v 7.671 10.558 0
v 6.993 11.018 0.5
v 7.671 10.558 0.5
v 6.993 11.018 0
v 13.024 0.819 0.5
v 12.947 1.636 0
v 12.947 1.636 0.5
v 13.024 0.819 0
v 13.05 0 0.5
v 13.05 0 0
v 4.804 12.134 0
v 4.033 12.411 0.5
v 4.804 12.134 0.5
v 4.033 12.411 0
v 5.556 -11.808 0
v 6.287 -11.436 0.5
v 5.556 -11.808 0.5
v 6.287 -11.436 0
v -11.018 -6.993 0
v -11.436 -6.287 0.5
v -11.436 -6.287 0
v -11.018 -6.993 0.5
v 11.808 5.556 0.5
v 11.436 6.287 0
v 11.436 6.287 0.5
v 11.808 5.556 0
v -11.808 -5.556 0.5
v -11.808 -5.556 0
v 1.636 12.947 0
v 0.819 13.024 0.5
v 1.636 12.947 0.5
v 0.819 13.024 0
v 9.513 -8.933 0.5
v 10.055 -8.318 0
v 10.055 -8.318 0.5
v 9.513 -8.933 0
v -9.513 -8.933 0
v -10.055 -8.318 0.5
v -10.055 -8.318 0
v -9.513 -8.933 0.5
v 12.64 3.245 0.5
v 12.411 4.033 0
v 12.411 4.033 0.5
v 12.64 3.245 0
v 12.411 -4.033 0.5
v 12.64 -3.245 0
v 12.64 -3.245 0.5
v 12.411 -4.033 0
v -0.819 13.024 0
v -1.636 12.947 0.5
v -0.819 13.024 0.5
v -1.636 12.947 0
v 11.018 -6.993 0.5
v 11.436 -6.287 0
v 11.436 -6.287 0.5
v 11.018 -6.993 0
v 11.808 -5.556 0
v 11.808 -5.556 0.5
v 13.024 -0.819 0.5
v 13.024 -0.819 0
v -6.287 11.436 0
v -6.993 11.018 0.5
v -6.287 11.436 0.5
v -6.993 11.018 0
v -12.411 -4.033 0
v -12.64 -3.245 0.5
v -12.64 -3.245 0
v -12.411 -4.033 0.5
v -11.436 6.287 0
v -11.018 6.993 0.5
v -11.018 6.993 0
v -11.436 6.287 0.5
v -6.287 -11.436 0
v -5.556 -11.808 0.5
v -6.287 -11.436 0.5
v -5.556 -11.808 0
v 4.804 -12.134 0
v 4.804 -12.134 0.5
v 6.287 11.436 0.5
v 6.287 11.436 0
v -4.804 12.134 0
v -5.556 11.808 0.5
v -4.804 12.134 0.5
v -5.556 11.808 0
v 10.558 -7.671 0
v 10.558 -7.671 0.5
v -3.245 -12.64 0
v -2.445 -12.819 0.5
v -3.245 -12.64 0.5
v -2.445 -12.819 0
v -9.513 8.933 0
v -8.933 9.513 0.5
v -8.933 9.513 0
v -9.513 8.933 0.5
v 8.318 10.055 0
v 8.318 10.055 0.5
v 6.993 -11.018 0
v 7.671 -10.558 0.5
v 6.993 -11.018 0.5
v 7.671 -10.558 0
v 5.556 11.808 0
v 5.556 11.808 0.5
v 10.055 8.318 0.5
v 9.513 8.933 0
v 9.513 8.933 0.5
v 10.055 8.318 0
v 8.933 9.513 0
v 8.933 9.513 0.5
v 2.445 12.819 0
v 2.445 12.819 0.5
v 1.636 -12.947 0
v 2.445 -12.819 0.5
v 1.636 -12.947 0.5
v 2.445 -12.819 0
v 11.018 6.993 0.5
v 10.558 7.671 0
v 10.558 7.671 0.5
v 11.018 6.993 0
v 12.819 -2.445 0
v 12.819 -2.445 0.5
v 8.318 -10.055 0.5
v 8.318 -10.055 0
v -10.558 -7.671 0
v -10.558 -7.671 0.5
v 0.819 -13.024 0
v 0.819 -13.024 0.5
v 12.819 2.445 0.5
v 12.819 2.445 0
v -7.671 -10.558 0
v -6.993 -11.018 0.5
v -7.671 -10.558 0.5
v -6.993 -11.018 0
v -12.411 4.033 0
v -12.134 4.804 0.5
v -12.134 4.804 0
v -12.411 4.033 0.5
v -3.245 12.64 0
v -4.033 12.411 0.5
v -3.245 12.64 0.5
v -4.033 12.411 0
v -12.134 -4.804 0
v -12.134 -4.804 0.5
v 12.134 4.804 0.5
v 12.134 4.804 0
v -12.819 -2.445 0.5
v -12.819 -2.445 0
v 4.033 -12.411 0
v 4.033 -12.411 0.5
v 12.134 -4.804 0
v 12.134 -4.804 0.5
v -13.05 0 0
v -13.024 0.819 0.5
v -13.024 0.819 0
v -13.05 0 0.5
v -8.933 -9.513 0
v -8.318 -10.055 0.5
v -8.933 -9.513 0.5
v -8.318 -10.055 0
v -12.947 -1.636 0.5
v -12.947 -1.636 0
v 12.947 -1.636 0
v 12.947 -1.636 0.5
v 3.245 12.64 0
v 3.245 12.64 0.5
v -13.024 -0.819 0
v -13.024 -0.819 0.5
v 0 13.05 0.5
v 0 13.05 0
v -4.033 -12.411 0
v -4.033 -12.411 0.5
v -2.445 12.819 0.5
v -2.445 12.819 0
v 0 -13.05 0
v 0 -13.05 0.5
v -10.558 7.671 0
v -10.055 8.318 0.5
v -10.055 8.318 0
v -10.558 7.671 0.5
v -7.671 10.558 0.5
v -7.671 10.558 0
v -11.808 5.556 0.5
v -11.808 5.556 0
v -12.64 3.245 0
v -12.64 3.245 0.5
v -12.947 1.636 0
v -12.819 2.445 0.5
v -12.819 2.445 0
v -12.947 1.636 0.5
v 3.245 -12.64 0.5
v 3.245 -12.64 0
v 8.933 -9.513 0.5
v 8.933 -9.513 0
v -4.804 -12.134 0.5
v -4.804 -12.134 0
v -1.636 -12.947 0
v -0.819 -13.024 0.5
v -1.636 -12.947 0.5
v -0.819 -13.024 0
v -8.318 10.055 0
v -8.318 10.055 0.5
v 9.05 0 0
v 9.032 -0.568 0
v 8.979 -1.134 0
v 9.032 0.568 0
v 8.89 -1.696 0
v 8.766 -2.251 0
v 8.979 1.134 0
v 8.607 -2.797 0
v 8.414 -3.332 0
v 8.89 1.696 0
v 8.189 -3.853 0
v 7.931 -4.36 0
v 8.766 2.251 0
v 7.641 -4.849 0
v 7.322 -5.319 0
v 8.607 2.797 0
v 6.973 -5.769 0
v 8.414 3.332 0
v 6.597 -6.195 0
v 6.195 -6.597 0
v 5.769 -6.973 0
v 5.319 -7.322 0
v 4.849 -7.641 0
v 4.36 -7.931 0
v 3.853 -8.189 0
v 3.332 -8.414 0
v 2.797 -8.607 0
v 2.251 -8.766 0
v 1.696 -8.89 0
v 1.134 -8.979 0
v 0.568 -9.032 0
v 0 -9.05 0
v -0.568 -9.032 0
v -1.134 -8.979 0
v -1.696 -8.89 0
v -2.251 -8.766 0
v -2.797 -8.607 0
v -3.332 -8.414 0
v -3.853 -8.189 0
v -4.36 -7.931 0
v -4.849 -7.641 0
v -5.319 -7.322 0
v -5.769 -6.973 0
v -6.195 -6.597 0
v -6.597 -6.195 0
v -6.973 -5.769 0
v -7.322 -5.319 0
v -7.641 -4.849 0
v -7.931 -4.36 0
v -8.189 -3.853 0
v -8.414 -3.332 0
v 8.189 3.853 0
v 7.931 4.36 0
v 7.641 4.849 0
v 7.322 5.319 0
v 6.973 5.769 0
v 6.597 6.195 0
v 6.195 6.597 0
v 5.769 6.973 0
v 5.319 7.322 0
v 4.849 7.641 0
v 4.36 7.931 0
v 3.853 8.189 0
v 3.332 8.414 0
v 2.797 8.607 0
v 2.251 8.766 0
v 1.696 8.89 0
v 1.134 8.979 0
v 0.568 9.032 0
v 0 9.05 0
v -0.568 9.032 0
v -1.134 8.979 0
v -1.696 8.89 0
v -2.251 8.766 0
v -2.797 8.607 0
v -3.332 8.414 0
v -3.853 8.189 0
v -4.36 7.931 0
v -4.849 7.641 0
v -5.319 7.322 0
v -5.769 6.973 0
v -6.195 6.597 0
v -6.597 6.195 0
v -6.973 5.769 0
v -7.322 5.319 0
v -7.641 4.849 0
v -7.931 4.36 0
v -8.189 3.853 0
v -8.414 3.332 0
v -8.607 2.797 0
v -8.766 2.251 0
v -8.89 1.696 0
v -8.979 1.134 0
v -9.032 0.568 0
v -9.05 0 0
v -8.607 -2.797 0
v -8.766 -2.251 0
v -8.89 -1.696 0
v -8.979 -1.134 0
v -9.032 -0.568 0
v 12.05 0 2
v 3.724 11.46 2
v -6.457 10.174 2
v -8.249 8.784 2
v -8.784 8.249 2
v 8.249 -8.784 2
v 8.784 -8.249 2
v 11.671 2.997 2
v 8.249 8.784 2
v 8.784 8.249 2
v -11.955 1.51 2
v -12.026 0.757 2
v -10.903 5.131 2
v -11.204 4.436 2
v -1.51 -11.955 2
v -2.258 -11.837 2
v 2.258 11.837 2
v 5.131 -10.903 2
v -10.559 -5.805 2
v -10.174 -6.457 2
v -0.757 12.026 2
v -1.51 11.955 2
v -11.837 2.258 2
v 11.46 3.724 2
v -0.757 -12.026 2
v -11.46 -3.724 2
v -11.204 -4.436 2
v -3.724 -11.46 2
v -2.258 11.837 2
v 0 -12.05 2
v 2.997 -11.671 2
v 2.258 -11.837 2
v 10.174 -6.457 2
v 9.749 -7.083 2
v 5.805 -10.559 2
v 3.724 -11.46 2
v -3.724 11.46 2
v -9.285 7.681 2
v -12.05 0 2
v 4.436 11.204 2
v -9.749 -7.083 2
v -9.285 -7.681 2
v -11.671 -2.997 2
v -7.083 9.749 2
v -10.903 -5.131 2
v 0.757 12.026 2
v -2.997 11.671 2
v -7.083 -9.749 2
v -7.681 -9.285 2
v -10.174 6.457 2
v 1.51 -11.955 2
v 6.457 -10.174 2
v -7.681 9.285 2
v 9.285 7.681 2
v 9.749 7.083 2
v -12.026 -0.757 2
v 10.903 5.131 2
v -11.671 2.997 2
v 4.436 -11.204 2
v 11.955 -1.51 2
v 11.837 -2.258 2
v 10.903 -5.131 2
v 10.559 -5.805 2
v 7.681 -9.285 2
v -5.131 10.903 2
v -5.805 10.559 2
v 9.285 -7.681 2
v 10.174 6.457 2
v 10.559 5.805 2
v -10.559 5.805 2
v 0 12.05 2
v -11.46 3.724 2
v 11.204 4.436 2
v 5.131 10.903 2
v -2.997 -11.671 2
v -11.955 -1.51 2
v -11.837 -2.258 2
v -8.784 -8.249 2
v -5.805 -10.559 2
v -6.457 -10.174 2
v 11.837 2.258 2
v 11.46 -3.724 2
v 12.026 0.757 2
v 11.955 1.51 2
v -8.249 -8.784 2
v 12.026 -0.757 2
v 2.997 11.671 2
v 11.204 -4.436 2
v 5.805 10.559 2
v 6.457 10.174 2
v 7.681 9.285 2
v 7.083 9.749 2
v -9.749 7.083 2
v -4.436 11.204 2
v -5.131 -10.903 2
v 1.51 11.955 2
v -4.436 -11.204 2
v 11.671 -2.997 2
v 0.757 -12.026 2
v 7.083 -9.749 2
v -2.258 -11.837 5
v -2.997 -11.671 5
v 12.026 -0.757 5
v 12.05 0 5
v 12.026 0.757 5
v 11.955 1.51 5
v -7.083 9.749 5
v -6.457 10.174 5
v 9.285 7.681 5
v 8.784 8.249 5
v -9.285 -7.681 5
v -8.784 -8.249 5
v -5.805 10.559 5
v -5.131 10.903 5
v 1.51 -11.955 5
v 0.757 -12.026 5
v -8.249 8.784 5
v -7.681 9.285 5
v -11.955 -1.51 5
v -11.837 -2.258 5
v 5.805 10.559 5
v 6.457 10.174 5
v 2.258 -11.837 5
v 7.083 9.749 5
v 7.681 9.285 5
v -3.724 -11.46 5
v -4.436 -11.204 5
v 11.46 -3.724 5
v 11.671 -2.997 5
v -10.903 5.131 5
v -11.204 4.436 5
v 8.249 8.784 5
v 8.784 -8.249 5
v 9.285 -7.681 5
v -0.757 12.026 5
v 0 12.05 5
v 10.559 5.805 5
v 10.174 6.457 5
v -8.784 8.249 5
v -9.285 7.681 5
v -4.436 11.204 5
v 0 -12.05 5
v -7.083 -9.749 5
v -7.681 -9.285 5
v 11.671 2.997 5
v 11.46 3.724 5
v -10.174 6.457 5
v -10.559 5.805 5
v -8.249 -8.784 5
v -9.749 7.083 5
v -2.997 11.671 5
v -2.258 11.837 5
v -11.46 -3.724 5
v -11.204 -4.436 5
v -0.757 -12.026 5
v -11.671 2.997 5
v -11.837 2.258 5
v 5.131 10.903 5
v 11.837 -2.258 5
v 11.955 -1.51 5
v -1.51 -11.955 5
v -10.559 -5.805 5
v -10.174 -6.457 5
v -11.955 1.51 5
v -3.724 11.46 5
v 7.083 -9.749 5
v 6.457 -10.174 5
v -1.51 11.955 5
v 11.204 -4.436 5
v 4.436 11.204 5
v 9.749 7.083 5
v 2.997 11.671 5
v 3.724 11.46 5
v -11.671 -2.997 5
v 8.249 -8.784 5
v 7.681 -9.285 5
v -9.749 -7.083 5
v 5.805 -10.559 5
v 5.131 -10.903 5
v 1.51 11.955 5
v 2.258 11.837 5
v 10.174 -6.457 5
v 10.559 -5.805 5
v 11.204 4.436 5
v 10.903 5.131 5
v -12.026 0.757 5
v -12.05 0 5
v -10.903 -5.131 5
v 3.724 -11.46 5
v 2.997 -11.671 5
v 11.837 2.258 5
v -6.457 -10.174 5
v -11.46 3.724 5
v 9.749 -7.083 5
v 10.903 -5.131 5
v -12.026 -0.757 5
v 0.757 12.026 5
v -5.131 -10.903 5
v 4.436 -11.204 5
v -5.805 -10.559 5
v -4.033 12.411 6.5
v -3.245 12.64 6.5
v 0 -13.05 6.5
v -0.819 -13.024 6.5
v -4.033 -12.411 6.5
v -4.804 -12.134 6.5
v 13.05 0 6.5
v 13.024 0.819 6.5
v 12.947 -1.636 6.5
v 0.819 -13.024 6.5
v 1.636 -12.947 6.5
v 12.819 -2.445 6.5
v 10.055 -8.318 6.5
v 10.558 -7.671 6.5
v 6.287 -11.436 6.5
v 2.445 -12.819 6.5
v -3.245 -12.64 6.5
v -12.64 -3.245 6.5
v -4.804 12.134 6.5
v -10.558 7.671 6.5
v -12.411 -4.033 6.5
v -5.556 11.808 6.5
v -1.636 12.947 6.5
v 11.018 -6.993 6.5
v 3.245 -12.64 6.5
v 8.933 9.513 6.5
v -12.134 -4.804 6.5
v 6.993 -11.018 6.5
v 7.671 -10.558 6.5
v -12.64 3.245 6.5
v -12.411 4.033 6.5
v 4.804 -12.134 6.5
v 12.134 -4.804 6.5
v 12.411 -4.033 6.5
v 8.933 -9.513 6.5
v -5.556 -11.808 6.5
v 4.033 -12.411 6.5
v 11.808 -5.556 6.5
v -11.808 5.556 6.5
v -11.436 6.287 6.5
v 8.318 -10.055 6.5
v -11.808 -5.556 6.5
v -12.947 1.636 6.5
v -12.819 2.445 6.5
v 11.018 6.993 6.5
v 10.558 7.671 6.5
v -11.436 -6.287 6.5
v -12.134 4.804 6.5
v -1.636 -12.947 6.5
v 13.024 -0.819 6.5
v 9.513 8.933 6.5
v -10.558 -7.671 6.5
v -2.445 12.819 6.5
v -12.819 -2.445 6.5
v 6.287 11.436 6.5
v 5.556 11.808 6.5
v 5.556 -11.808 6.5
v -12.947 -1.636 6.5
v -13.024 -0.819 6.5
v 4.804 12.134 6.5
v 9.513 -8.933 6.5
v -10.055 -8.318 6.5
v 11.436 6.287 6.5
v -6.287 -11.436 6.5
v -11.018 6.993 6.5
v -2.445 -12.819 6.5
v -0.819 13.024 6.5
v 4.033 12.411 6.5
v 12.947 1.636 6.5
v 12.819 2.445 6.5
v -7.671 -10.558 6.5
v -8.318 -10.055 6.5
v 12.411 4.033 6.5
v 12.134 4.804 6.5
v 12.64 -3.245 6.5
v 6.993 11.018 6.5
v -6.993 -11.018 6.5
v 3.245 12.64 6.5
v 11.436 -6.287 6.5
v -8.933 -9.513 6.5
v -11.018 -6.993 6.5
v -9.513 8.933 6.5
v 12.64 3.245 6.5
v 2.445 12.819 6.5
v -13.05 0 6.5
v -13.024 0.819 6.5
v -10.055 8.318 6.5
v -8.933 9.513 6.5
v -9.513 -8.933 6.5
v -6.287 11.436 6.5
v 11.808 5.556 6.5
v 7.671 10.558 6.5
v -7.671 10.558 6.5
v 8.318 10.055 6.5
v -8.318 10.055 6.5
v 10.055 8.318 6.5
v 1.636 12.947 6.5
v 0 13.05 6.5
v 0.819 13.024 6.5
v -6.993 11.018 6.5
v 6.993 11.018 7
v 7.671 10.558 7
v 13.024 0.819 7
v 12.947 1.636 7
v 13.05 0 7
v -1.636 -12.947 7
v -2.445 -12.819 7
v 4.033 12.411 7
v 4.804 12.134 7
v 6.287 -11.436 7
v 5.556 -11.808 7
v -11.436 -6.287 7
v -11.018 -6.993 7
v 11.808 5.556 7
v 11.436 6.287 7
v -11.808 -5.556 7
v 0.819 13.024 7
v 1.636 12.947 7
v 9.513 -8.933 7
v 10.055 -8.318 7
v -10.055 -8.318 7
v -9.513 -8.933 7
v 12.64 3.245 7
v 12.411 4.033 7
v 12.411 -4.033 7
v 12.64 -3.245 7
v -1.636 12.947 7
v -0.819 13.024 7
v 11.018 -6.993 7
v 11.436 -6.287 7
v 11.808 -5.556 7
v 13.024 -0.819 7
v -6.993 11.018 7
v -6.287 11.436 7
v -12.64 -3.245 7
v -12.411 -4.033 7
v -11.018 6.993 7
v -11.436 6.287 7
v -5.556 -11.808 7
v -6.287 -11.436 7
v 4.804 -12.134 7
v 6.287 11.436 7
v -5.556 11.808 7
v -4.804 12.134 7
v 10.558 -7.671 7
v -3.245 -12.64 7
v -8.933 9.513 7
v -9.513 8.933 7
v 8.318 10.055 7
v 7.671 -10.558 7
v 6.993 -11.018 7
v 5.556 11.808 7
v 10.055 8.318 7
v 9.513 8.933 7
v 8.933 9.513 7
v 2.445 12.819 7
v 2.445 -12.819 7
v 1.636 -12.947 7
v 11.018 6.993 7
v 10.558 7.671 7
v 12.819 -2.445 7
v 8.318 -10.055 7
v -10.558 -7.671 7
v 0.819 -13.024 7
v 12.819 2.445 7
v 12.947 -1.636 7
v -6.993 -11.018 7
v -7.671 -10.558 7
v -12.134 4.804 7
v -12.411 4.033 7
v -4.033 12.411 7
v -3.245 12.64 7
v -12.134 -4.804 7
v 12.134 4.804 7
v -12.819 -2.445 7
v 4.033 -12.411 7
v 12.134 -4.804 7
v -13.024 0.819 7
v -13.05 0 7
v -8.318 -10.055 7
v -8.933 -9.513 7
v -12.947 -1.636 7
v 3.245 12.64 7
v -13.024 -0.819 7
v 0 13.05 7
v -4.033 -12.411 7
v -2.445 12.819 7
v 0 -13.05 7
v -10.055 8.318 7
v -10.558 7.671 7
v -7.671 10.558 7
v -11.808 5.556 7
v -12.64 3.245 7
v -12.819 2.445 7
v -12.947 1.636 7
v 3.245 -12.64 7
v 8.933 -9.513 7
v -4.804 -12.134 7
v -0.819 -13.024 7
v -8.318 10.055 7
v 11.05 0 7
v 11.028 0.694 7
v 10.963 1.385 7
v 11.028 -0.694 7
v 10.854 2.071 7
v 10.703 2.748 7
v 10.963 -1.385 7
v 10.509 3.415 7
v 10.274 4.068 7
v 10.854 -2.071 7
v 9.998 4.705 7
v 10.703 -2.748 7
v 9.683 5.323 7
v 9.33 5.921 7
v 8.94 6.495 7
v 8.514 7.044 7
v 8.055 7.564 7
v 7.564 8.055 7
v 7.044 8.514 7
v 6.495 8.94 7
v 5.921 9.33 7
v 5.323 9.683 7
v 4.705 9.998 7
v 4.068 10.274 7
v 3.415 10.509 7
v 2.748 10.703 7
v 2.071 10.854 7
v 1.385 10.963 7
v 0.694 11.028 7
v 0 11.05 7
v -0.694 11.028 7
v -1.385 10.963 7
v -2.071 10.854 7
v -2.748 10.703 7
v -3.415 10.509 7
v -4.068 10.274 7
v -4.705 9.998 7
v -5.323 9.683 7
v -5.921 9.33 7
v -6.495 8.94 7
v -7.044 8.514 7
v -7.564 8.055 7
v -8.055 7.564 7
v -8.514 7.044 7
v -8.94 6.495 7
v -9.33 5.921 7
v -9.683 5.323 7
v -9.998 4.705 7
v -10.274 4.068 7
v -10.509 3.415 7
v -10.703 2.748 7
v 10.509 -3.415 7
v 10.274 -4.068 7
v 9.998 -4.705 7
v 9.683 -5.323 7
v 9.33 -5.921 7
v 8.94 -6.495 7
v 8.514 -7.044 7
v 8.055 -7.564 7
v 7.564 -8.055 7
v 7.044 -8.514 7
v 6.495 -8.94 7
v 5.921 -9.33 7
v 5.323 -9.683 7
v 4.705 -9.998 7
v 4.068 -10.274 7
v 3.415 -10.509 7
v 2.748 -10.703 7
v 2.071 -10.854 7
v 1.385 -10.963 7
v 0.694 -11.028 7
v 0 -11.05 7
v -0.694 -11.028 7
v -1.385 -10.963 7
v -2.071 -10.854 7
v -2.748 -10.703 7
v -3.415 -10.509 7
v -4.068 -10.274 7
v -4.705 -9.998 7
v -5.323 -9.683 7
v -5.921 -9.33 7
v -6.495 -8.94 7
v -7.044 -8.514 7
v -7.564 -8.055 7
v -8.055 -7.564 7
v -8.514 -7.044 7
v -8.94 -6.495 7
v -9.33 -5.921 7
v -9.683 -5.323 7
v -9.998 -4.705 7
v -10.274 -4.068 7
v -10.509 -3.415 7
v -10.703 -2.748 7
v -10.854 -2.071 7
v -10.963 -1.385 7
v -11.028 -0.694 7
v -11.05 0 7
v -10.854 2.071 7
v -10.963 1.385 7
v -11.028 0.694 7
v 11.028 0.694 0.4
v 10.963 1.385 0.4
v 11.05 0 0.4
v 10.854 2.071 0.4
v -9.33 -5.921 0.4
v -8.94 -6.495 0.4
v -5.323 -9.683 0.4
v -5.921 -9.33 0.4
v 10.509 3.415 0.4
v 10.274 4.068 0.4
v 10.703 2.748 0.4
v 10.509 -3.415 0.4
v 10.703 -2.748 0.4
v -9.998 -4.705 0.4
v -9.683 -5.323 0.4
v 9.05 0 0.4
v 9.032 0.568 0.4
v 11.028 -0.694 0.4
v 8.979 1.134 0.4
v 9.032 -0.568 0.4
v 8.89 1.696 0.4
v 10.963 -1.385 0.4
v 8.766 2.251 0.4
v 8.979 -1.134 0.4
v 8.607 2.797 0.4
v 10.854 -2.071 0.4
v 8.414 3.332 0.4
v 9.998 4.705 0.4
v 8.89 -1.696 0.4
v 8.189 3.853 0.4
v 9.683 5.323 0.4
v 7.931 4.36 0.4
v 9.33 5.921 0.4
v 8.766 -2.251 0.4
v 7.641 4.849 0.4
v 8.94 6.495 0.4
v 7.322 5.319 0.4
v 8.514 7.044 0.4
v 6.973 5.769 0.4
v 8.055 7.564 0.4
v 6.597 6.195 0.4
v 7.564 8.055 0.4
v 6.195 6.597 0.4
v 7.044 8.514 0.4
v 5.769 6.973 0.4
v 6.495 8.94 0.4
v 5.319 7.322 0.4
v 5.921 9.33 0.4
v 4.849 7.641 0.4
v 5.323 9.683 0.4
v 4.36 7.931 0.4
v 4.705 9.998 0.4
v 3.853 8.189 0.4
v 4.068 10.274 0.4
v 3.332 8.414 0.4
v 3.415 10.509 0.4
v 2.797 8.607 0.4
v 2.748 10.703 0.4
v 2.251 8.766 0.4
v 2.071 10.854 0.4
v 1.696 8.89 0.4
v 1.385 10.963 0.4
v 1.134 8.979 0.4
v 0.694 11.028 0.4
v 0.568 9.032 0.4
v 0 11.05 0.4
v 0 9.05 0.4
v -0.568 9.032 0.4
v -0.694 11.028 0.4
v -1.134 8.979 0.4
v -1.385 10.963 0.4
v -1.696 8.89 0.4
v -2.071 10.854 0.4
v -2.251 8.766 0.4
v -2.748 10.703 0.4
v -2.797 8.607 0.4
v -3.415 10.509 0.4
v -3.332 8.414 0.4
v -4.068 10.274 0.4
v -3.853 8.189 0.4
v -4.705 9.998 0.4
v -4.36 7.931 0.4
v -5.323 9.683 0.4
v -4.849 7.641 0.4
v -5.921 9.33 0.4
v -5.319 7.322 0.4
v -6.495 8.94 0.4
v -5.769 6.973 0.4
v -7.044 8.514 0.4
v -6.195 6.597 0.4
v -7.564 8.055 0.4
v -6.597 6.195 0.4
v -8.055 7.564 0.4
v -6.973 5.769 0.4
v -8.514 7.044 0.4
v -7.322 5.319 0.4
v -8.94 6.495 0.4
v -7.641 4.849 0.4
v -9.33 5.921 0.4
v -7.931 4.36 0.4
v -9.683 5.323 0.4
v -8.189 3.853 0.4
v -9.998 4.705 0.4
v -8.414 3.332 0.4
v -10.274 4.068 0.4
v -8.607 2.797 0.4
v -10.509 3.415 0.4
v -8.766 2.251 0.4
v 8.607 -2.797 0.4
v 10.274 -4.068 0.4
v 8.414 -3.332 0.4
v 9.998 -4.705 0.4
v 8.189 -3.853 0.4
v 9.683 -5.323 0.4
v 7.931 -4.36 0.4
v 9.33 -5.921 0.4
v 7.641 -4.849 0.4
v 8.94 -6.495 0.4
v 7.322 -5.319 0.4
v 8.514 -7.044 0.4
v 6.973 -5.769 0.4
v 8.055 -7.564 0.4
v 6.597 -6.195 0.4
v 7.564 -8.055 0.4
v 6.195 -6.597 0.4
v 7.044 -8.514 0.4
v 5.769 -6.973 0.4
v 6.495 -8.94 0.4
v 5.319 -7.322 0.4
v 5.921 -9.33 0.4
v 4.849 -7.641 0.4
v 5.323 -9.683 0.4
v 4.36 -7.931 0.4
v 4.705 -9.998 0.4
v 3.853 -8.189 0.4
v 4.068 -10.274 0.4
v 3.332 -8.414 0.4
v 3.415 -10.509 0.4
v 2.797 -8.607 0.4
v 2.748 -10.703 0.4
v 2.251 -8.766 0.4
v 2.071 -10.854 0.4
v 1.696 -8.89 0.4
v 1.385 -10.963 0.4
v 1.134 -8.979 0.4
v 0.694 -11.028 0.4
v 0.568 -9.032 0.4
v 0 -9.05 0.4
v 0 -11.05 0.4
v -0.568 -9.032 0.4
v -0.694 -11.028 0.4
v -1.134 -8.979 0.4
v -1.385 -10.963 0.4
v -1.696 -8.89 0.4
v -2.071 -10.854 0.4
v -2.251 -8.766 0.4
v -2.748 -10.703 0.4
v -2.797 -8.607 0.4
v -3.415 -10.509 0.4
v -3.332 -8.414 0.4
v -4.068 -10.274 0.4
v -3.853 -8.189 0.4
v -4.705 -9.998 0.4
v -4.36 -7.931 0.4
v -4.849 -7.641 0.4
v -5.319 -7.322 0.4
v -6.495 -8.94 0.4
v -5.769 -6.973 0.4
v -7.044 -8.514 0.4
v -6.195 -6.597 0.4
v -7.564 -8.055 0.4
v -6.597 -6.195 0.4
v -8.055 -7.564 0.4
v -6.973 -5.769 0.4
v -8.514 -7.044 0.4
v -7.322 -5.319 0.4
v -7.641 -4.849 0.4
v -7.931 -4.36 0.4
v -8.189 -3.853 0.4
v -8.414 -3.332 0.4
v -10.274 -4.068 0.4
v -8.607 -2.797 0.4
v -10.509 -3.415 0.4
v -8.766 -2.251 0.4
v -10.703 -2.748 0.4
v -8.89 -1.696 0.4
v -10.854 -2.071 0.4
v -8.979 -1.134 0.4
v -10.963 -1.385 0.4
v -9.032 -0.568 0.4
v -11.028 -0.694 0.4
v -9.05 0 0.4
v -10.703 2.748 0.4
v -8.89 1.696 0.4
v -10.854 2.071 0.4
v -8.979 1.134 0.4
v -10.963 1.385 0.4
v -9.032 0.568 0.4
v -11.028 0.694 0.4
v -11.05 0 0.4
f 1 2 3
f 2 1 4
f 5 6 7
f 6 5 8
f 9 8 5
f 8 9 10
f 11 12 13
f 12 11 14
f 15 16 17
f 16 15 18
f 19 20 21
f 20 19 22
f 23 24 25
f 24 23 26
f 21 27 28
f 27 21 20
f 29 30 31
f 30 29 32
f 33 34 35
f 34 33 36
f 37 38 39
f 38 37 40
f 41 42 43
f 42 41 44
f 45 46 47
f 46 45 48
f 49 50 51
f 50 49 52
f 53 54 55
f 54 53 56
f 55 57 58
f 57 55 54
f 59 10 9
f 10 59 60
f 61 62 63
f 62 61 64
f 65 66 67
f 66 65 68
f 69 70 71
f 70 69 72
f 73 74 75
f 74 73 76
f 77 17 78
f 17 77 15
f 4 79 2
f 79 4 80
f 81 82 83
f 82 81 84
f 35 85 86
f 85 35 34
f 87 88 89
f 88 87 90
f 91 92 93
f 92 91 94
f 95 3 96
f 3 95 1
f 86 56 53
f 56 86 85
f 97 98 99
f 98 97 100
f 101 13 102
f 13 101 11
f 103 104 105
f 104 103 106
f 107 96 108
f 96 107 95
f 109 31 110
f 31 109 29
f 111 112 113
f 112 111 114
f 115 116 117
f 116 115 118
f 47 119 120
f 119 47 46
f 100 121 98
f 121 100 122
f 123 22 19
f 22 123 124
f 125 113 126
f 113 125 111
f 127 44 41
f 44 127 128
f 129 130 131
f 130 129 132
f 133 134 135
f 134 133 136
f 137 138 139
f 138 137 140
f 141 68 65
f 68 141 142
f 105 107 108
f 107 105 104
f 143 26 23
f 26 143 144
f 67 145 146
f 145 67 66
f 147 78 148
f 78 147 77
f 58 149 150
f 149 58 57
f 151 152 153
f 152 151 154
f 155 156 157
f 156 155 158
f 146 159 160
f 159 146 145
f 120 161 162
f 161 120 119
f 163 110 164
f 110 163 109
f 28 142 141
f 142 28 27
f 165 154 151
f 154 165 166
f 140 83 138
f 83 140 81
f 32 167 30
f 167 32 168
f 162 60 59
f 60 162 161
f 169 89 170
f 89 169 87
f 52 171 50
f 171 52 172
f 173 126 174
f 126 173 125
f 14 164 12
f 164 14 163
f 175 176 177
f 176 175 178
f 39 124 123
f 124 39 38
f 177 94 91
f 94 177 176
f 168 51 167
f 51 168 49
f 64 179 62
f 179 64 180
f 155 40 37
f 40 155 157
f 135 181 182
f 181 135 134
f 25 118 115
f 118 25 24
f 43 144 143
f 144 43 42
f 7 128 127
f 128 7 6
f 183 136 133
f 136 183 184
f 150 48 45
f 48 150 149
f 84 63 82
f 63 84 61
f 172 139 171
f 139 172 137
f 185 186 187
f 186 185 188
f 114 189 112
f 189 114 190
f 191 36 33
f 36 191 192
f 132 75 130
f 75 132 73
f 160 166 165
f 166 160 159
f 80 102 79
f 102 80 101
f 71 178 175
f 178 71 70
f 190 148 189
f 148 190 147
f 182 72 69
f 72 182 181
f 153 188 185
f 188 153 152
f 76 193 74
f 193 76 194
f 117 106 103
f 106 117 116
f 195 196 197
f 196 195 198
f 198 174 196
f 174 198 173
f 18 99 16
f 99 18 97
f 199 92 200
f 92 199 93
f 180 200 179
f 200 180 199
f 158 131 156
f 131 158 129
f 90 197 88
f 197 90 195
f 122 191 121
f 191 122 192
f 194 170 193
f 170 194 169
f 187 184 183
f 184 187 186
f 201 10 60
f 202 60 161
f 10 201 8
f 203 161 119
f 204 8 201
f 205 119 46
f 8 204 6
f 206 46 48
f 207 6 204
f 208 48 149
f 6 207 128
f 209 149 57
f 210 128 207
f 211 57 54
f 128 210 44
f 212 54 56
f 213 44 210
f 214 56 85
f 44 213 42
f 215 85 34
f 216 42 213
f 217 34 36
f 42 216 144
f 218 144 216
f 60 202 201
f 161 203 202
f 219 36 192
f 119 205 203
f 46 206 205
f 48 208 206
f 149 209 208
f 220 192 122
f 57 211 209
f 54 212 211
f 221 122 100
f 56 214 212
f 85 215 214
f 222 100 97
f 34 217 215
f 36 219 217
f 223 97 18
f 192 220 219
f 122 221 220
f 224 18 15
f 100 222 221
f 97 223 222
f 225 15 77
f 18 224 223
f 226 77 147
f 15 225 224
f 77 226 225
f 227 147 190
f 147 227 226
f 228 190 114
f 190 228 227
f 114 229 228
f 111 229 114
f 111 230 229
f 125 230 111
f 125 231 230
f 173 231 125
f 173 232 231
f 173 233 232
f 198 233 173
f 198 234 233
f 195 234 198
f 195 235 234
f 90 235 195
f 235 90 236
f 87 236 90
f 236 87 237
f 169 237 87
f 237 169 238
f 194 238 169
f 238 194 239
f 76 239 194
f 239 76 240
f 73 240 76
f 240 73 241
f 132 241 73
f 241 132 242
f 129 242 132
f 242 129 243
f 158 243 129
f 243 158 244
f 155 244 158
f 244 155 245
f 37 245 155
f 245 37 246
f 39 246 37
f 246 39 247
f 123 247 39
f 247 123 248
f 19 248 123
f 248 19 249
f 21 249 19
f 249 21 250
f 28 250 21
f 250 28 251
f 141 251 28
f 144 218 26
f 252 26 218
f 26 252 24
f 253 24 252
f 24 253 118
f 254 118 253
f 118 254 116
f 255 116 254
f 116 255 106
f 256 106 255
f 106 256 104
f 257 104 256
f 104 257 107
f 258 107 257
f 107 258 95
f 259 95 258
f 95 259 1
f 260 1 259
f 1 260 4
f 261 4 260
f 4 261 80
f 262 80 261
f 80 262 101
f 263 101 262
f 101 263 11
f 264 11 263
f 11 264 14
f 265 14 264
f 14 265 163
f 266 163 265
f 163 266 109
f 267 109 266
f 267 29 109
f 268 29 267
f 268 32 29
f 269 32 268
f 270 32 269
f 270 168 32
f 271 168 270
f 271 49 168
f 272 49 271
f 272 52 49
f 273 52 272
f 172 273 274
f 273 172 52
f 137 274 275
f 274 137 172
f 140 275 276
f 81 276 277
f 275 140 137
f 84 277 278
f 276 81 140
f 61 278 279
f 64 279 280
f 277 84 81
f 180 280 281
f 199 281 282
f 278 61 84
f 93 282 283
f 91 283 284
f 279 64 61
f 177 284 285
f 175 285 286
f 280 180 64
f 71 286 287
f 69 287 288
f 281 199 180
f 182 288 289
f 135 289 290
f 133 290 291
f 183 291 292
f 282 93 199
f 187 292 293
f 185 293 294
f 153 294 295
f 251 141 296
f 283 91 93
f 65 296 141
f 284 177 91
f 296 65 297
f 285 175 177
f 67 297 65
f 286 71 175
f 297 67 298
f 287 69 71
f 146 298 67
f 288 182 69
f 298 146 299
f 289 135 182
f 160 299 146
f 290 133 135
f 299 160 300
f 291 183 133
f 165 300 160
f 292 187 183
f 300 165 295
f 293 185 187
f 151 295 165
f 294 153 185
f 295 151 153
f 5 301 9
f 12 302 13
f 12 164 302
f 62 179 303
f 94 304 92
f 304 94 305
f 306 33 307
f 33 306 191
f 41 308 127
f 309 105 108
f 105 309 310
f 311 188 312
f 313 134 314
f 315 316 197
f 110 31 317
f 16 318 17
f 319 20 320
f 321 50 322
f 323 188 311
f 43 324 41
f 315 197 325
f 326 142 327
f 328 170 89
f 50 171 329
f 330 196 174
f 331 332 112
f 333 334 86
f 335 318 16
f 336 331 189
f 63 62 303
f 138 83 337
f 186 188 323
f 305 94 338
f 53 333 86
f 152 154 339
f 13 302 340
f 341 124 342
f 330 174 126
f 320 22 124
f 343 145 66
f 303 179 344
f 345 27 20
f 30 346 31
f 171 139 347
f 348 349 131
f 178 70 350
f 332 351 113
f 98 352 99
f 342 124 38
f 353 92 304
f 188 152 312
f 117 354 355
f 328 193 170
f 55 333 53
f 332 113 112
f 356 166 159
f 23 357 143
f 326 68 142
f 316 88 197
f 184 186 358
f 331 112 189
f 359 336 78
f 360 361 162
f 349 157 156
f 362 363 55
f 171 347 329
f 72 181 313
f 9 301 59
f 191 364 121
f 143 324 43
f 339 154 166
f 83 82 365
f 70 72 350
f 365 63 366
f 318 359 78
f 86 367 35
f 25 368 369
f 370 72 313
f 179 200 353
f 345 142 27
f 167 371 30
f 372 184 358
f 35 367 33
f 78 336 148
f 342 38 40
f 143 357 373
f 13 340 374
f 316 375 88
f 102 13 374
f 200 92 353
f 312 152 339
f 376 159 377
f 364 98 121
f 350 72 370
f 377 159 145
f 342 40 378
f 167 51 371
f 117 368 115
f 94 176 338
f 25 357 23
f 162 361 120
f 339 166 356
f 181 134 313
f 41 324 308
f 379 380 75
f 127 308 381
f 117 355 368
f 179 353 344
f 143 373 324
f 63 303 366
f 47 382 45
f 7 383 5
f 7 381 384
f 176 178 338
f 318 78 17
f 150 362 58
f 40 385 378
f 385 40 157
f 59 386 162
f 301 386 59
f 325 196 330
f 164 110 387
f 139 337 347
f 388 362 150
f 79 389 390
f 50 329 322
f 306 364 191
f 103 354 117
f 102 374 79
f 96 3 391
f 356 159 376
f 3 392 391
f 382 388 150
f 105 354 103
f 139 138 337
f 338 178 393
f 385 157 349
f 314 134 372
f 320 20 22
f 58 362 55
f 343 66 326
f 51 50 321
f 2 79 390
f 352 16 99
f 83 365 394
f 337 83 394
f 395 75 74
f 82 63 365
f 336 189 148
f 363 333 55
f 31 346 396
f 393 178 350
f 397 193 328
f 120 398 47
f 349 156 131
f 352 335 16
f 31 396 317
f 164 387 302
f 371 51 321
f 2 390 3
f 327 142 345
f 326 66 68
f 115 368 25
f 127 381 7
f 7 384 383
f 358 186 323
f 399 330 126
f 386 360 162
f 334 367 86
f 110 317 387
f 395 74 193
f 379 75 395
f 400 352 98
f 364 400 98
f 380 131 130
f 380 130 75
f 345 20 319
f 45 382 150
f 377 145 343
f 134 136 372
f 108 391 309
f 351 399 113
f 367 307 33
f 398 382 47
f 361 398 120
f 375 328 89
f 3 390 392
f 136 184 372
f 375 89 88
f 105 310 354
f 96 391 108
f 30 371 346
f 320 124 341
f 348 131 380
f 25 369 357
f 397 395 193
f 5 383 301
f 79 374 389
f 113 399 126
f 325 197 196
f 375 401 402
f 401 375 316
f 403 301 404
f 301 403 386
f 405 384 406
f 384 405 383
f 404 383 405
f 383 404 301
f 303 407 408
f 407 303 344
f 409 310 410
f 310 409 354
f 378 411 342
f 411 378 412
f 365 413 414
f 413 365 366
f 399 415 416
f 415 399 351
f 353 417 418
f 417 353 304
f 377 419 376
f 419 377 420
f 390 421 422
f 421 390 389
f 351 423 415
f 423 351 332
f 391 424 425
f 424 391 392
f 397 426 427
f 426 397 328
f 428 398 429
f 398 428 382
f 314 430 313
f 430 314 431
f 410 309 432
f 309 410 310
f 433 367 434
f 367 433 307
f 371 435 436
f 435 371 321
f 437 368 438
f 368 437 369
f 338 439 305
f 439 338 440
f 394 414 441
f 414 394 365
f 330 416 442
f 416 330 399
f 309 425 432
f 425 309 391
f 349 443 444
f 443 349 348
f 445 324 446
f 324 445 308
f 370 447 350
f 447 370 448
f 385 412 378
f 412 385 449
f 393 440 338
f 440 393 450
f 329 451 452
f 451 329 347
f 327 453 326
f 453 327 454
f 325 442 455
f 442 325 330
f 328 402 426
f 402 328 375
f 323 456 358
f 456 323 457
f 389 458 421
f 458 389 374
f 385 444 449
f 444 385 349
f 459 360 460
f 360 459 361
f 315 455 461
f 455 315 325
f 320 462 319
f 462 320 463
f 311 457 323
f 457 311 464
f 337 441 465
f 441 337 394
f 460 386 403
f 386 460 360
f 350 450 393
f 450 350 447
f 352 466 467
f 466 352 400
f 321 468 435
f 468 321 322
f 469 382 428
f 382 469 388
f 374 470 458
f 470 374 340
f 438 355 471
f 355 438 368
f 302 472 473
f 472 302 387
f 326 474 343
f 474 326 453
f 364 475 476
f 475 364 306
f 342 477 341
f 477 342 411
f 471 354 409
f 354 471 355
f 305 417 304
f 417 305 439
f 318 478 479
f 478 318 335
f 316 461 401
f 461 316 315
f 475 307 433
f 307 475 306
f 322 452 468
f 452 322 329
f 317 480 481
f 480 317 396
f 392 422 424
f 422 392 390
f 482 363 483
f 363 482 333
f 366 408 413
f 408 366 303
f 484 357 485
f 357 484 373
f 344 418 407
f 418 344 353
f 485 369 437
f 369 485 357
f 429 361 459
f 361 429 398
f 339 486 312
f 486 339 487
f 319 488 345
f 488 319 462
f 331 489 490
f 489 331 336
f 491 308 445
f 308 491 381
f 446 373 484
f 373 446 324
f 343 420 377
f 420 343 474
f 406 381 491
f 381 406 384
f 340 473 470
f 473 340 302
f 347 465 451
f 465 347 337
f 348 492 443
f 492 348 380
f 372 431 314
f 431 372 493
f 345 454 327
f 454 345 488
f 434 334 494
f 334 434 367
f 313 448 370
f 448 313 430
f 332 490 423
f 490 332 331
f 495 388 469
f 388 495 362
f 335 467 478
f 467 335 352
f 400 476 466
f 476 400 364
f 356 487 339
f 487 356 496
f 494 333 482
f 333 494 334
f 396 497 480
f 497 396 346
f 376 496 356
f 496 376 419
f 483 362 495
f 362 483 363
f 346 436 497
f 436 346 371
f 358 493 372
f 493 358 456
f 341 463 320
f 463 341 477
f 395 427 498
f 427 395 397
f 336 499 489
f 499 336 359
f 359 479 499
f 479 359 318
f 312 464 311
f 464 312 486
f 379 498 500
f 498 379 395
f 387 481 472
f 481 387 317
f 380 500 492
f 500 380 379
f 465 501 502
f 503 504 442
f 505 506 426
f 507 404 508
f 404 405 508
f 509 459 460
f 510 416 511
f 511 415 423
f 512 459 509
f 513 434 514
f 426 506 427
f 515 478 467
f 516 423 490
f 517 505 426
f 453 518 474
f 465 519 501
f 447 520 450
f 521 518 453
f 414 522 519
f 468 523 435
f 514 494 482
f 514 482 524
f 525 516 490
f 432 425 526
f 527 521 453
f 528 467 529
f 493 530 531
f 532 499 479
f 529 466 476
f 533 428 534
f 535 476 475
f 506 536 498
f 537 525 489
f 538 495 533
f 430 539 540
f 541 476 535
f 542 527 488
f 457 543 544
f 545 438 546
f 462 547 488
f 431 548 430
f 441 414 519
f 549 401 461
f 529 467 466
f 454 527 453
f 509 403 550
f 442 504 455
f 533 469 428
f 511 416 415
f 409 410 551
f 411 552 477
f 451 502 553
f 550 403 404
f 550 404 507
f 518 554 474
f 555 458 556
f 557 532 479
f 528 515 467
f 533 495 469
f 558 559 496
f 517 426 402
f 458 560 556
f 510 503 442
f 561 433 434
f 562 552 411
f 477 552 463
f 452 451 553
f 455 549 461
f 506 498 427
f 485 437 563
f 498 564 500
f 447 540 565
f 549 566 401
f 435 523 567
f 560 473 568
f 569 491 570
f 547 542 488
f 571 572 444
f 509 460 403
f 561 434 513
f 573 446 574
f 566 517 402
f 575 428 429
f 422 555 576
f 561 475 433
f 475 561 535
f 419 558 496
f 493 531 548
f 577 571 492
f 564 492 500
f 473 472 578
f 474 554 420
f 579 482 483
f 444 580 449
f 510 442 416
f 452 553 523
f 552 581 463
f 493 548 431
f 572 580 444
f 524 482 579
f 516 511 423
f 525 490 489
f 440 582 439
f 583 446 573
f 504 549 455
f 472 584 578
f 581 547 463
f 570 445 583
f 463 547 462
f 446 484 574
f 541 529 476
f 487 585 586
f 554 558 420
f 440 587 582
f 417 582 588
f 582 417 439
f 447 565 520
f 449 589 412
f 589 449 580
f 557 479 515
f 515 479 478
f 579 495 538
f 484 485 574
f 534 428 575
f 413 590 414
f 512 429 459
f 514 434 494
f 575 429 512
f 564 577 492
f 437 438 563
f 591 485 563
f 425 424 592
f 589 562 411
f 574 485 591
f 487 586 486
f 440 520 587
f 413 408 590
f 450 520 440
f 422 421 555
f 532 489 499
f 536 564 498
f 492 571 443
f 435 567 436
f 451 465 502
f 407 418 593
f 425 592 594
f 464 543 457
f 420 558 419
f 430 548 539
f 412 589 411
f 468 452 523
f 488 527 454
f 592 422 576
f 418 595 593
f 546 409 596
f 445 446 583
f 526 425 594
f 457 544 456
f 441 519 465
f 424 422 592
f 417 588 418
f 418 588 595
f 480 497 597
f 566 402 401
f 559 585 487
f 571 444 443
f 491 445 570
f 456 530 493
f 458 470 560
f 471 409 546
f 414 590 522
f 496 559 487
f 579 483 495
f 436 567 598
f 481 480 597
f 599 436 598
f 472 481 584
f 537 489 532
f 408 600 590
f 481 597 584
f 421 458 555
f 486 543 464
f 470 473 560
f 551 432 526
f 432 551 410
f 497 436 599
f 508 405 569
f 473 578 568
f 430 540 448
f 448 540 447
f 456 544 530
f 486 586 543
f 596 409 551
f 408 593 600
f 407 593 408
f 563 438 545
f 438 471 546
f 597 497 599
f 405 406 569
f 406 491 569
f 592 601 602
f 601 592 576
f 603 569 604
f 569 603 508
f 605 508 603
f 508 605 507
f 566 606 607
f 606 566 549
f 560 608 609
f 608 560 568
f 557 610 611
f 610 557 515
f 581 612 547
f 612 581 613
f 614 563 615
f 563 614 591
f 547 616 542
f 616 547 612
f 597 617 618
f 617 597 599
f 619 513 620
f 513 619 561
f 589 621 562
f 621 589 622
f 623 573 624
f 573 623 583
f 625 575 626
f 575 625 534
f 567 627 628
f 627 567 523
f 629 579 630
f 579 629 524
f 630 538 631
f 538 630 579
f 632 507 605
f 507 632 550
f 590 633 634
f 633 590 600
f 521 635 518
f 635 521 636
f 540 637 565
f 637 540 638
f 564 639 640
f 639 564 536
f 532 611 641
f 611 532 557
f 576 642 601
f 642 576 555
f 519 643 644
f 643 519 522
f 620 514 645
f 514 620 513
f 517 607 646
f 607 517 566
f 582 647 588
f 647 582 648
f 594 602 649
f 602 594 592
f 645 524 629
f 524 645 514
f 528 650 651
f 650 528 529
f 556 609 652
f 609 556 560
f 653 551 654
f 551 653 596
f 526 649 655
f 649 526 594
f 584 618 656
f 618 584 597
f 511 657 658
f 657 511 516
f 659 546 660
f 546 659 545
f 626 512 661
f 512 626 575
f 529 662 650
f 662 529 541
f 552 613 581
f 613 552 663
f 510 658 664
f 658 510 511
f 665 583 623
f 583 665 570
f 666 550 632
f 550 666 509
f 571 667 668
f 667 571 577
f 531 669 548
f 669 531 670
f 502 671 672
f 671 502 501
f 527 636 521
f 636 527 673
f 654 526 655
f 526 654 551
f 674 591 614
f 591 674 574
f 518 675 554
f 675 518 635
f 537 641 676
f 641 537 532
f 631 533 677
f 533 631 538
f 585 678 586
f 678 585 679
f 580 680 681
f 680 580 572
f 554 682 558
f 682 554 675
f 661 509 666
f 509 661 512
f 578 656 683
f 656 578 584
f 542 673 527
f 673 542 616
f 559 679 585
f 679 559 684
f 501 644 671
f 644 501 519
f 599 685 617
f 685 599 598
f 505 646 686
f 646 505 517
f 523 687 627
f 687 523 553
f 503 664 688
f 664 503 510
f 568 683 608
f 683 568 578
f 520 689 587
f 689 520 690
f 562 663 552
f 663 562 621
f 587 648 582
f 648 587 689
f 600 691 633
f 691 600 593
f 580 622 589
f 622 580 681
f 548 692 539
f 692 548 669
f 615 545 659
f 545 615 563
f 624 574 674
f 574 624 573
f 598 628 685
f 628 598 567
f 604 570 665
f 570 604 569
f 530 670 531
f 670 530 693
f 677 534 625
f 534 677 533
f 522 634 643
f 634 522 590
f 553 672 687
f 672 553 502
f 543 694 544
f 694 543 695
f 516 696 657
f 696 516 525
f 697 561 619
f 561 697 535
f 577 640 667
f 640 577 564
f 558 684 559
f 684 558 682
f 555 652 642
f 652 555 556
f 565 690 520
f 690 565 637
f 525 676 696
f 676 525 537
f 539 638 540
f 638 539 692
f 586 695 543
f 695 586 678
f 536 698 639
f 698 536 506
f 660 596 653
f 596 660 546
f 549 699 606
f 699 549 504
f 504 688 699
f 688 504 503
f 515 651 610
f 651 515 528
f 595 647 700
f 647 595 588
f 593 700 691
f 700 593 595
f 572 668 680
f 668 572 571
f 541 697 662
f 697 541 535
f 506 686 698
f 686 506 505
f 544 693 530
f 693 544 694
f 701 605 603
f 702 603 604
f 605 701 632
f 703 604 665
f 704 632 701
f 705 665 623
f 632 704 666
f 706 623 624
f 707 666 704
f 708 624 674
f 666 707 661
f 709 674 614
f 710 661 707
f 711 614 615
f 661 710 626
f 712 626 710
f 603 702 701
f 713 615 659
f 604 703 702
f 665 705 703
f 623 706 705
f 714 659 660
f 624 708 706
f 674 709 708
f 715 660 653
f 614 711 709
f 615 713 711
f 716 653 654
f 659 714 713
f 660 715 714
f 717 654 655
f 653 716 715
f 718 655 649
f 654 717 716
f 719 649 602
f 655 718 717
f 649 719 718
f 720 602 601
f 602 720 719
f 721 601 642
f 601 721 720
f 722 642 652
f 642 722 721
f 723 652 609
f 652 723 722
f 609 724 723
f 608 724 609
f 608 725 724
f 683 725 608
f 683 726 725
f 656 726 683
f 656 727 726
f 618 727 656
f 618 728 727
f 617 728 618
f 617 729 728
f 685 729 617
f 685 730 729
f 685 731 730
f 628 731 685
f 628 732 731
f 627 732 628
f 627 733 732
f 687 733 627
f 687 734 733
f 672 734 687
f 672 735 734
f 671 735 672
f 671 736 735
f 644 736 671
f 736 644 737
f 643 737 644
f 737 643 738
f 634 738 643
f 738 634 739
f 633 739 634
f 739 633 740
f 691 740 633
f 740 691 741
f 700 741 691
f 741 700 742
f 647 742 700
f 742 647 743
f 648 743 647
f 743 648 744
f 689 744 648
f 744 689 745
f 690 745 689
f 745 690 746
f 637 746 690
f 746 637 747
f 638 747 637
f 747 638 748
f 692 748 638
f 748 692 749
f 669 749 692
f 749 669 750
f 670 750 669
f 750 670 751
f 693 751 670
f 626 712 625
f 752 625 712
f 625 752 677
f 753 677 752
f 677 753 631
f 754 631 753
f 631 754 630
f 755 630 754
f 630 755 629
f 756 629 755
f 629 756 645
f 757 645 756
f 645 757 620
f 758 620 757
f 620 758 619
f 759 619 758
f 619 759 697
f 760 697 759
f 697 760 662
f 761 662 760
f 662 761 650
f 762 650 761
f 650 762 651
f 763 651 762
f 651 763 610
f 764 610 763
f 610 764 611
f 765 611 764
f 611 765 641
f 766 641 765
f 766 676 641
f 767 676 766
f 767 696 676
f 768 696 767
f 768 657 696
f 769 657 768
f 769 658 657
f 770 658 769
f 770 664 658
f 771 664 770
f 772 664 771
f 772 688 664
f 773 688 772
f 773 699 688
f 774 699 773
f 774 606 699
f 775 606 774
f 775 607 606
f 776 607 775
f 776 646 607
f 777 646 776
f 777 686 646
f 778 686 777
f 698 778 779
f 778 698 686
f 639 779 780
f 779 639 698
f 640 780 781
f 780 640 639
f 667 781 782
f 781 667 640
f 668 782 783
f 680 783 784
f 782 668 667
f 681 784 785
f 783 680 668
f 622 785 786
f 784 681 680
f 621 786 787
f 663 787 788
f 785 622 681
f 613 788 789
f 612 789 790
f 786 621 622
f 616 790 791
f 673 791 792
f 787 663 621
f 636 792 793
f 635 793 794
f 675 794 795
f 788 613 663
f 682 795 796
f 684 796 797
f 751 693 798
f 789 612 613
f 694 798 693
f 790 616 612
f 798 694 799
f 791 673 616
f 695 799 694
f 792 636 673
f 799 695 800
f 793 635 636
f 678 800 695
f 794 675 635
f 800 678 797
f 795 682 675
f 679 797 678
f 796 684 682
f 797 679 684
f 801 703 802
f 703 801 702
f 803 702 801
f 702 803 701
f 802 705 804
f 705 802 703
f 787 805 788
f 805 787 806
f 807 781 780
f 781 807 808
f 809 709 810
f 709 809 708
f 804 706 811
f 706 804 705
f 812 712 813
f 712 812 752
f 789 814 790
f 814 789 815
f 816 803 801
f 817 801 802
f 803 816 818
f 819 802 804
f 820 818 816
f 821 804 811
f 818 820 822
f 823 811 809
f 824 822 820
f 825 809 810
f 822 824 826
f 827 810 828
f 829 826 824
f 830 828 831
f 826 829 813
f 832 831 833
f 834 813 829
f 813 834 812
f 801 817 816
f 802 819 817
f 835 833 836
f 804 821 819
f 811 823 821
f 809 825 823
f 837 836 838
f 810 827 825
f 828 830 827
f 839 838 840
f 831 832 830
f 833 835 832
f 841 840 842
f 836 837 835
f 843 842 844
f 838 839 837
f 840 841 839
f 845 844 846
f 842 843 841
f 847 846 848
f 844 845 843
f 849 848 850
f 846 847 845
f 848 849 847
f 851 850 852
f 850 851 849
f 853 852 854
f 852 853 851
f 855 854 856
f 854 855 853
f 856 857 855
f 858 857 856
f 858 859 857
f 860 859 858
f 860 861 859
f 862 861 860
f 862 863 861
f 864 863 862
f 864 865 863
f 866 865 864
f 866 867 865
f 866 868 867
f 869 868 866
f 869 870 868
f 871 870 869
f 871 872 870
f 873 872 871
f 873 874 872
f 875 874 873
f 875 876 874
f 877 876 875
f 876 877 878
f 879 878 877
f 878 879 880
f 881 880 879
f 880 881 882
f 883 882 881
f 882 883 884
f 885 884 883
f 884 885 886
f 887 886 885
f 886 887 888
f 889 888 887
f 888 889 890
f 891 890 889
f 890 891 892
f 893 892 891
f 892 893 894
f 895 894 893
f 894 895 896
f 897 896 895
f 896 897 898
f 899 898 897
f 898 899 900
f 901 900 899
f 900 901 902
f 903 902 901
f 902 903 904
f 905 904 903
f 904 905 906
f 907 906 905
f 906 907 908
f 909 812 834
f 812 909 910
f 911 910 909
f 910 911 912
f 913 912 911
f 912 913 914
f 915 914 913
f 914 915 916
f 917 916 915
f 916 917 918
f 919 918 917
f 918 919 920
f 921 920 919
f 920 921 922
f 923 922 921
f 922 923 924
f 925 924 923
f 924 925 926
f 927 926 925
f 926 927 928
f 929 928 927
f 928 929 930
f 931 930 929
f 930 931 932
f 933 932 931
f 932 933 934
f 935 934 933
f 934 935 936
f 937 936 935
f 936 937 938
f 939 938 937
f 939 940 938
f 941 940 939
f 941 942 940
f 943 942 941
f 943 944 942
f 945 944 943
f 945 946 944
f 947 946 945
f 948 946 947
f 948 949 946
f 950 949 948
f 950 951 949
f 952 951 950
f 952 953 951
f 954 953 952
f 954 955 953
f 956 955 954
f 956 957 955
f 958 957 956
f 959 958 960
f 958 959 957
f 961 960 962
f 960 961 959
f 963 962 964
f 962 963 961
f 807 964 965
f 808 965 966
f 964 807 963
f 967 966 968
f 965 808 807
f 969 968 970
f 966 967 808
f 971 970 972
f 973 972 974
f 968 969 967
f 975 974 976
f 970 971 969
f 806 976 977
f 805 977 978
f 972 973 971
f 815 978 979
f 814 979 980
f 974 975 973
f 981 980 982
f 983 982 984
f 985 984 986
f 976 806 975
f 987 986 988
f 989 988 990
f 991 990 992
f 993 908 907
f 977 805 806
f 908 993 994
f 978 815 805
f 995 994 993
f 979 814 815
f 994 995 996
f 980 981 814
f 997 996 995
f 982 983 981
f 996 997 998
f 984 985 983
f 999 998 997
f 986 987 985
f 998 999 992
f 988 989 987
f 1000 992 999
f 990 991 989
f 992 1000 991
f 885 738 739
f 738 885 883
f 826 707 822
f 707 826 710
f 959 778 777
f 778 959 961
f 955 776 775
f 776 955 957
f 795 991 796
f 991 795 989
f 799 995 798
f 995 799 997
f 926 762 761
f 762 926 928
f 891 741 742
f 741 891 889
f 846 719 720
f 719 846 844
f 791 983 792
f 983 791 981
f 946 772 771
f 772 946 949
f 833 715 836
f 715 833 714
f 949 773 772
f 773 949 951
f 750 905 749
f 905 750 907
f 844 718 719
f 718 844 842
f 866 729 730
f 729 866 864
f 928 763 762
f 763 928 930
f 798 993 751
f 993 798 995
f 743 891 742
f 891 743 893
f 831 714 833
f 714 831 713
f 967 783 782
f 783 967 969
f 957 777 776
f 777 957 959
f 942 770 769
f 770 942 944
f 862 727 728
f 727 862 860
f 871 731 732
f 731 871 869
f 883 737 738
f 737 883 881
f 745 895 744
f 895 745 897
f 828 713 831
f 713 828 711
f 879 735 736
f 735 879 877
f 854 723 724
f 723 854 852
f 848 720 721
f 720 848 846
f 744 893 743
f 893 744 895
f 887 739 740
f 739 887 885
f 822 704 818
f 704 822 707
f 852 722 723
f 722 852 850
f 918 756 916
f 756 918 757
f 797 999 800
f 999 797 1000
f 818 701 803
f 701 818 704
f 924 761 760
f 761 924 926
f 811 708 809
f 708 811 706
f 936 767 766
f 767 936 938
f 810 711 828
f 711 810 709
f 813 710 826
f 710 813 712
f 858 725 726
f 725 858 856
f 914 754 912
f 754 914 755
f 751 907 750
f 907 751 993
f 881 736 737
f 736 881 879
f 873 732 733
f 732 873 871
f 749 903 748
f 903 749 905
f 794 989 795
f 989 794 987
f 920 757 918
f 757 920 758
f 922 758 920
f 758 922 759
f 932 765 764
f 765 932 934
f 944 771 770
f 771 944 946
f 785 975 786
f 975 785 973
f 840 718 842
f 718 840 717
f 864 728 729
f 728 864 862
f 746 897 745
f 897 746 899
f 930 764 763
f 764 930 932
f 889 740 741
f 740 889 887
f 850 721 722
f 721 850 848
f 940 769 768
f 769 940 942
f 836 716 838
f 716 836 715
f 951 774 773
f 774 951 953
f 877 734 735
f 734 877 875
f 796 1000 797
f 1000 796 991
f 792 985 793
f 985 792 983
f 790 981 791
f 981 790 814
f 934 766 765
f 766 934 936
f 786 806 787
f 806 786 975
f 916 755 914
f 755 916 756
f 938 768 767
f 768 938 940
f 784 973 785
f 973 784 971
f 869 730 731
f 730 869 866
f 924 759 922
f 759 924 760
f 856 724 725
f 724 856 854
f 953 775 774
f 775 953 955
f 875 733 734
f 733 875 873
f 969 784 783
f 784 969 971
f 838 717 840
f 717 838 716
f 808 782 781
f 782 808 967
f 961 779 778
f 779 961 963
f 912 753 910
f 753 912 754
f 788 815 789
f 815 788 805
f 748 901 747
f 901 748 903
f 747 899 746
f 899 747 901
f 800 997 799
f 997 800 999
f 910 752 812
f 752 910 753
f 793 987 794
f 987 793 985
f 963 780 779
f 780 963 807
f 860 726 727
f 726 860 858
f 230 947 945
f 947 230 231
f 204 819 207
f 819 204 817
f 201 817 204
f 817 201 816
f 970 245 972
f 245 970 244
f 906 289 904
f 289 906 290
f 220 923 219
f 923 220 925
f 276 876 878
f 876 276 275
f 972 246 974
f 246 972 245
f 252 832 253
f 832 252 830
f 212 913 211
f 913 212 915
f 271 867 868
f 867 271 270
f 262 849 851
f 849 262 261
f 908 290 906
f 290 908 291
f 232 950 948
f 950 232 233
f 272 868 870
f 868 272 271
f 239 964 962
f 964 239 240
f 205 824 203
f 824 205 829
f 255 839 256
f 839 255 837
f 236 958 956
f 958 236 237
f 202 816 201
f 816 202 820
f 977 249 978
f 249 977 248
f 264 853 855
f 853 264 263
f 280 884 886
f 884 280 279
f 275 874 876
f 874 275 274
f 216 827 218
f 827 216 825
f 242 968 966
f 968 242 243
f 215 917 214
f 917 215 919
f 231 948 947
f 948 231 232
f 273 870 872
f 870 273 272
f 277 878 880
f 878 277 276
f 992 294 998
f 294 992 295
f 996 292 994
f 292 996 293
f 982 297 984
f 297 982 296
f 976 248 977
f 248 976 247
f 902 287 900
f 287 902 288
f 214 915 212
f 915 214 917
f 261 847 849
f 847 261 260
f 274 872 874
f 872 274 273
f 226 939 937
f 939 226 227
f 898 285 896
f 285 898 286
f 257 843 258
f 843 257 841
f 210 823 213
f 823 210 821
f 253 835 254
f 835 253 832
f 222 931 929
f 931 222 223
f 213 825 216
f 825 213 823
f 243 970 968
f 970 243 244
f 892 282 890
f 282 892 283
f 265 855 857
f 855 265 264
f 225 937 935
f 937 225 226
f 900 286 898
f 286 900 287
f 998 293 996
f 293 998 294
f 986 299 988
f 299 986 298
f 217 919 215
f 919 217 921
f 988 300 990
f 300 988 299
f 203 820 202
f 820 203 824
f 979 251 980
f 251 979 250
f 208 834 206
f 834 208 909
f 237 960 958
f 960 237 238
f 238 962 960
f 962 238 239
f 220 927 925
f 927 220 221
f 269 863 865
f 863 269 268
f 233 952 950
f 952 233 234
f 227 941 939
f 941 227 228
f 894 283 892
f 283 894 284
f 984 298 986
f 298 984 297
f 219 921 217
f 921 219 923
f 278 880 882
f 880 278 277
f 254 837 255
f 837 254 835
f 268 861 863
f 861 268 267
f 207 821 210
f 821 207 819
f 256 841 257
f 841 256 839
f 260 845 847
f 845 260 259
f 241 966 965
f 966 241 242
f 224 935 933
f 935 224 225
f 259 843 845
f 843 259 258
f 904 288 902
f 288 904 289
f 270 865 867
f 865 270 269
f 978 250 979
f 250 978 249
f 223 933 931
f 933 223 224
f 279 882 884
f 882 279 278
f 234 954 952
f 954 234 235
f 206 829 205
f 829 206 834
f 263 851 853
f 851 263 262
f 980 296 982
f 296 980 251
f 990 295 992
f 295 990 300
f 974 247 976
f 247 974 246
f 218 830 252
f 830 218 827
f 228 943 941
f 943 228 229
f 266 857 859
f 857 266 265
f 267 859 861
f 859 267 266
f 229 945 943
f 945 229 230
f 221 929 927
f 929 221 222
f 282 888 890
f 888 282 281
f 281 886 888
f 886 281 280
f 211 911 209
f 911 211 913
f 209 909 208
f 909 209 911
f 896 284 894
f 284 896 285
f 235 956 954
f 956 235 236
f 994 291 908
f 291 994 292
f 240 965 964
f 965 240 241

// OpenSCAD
$fn = 100;
epsilon = 0.01;
nozzle_d = 0.4;

filament_wheel();

module filament_wheel(){
    // main parameters
    wt = 2; // wall thickness
    bb_d = 22 + 0.1;
    bb_h = 7;
    whl_d = bb_d + wt;
    whl_h = bb_h;

    difference(){
        union() {
            // translate([whl_d, 0, 0]) cylinder(d=bb_d, h=bb_h);

            translate([0, 0, 0]) cylinder(d=whl_d + wt, h=wt*0.25);
            translate([0, 0, wt*0.25]) cylinder(d1=whl_d + wt, d2=whl_d, h=wt*0.75);
            translate([0, 0, wt]) cylinder(d=whl_d, h=whl_h - 2*wt);
            translate([0, 0, whl_h - wt]) cylinder(d1=whl_d, d2=whl_d + wt, h=wt*0.75);
            translate([0, 0, whl_h - 0.25*wt]) cylinder(d=whl_d + wt, h=wt*0.25);
        }

        // cut out
        // translate([0, (arm_h + arm_d/2)/3.5, 8*wt])
        translate([0,0, 0.4]) cylinder(h=1000, d=bb_d);
        translate([0,0, -10]) cylinder(h=1000, d=bb_d-2*wt);
    }
}
